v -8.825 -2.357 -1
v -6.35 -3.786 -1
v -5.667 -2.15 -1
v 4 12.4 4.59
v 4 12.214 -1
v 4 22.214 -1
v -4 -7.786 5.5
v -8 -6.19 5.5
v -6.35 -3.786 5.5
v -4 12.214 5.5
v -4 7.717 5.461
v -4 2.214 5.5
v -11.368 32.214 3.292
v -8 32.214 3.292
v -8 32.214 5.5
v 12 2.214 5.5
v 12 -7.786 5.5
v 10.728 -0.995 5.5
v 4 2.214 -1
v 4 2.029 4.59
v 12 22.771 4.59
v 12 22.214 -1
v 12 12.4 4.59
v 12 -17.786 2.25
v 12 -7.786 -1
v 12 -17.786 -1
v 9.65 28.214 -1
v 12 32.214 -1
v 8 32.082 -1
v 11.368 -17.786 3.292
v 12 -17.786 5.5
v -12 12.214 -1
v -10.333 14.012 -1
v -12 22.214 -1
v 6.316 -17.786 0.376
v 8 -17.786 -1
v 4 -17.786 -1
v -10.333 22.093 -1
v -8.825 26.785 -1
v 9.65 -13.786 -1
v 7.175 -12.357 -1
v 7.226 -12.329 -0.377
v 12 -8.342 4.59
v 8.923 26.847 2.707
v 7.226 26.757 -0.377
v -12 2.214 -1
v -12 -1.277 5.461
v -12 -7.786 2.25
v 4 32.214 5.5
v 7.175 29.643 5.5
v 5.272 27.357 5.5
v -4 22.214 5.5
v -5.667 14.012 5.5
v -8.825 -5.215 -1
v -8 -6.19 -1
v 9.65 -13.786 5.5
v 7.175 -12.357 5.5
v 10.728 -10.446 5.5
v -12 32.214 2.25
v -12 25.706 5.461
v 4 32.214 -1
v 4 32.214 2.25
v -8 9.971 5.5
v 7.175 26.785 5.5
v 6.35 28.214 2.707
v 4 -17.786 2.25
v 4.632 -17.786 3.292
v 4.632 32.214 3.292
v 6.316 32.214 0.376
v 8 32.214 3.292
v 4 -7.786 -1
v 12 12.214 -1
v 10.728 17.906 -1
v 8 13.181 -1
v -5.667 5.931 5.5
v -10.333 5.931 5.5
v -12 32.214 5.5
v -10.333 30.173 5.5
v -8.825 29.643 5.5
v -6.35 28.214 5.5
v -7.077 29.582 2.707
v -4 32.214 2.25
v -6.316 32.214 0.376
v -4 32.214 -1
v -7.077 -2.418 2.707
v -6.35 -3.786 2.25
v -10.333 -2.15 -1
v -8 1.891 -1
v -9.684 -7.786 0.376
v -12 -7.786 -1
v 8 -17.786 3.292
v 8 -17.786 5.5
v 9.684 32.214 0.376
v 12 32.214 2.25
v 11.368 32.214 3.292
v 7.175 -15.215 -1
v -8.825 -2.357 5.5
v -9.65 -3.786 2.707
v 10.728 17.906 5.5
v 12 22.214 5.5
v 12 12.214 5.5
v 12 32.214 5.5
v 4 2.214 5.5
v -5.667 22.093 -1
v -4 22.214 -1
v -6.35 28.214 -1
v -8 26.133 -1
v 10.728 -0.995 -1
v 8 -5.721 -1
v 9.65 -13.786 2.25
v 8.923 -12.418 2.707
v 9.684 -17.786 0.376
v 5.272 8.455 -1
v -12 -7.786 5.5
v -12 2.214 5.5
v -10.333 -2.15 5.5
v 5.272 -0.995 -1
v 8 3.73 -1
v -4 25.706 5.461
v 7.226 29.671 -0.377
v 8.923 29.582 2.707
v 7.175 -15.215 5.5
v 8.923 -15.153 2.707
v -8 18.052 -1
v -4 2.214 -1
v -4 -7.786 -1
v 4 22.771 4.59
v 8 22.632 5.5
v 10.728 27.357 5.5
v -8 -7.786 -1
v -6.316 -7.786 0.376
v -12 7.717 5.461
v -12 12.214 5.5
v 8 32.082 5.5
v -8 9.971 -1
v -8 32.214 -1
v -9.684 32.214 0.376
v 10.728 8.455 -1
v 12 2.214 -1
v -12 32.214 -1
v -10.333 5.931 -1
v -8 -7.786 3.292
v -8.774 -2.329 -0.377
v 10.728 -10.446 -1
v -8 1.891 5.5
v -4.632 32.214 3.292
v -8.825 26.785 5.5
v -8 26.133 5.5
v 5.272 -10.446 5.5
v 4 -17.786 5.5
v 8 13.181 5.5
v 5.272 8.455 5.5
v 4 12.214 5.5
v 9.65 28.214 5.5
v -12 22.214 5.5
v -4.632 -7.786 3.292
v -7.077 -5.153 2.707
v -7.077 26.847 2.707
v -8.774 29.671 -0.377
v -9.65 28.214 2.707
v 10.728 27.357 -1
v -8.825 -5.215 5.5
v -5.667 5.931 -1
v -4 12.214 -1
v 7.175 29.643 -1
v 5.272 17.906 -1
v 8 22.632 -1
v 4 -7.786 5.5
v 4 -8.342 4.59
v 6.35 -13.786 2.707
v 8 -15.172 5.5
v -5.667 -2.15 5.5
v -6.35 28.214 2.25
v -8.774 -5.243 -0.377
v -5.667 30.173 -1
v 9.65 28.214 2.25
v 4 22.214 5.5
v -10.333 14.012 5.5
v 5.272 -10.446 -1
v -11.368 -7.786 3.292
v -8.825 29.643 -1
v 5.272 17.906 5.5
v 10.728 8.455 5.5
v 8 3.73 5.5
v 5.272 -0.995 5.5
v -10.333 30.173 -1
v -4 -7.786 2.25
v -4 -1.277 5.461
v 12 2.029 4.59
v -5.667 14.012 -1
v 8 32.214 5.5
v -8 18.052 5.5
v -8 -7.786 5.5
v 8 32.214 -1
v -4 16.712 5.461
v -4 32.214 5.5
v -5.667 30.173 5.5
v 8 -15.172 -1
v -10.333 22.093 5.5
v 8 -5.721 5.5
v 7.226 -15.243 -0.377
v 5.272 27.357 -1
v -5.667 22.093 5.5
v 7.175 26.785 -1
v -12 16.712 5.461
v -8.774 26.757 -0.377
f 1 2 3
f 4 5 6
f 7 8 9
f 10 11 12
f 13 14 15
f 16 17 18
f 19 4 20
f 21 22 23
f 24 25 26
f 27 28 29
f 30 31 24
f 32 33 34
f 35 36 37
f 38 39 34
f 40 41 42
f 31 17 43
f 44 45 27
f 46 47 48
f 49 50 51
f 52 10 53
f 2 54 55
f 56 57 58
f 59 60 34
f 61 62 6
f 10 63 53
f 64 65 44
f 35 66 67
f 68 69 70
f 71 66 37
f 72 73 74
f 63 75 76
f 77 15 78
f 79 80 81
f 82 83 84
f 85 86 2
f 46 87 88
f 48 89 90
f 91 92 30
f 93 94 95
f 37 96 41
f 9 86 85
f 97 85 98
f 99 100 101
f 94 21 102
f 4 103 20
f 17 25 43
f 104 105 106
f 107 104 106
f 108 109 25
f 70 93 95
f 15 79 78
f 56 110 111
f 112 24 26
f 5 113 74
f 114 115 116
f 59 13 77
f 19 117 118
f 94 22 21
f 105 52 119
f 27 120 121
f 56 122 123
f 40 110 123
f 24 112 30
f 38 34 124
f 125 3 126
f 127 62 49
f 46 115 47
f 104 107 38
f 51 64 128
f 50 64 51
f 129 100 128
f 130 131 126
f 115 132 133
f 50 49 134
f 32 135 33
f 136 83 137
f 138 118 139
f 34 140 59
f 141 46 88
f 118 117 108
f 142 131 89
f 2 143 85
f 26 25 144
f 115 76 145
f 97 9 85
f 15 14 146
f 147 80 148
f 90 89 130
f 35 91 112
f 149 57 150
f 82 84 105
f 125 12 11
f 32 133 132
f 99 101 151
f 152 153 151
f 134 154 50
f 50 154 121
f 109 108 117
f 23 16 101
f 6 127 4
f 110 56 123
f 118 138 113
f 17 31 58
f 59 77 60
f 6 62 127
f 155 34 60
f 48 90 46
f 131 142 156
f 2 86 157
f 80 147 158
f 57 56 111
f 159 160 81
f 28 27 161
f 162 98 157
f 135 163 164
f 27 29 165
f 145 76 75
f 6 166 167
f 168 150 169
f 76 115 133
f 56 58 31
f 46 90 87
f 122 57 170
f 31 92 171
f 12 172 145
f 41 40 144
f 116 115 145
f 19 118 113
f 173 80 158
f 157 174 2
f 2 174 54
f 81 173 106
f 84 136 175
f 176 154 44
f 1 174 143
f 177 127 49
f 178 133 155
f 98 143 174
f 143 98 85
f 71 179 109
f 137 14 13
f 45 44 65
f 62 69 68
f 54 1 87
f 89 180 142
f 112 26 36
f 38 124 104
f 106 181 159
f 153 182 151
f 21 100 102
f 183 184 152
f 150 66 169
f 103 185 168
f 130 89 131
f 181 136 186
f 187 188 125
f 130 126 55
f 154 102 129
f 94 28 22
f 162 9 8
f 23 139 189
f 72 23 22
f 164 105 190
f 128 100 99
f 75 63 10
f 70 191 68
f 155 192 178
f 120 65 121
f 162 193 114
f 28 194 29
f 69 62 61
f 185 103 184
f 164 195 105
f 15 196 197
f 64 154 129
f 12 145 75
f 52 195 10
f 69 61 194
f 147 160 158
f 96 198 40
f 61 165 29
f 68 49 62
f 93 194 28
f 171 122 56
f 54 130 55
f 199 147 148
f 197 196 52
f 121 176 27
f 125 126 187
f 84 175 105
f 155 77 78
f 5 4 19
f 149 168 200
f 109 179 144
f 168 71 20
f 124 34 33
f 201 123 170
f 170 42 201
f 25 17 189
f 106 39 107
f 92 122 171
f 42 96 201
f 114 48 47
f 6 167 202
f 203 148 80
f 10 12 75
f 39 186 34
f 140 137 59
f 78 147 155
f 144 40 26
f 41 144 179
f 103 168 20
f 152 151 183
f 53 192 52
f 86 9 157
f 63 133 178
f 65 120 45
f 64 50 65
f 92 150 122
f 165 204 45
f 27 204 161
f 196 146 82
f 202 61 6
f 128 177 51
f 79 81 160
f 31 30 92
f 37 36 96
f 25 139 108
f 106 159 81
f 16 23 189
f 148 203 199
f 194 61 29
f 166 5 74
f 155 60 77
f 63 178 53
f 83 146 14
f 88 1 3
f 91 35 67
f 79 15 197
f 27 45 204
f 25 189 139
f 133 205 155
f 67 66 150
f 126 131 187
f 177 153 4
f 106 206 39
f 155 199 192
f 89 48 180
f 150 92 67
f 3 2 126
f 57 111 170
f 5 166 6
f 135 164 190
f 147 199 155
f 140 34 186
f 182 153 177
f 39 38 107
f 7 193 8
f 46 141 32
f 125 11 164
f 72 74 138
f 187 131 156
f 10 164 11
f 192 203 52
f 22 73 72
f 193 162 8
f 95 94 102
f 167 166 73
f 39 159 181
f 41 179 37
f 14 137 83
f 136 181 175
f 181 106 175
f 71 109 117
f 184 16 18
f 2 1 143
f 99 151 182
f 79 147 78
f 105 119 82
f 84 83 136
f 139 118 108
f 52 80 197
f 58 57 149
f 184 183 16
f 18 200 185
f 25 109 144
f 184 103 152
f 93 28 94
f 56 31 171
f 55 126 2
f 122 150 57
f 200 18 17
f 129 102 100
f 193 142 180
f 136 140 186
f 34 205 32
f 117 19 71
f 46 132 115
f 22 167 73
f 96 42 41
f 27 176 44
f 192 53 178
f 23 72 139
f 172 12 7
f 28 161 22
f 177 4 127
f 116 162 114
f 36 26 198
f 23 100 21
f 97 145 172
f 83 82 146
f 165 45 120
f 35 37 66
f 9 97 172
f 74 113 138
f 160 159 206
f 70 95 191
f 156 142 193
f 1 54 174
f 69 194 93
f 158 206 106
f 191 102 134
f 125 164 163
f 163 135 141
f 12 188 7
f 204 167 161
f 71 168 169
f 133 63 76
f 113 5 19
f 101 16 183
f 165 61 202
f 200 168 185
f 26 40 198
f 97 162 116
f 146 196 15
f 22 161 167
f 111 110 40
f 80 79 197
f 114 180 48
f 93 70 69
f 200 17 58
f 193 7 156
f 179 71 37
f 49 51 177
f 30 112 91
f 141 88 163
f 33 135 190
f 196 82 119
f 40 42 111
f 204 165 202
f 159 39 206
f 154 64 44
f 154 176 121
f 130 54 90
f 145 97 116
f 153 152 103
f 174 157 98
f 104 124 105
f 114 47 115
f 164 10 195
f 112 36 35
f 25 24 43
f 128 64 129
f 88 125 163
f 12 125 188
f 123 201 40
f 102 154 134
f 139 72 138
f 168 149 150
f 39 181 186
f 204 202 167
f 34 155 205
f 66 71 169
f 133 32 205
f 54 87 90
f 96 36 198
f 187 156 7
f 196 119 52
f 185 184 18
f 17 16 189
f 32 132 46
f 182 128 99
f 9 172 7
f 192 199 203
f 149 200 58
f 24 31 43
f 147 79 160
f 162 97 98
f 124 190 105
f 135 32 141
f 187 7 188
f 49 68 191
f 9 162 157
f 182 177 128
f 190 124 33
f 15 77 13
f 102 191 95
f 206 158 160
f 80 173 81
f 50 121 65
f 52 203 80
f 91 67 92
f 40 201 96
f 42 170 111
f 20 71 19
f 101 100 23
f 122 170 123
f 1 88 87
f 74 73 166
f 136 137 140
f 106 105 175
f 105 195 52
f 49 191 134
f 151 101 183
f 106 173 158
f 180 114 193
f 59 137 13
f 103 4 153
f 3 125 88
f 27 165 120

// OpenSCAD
// CSG file generated from FreeCAD 0.16.6706 (Git)
group() {
 group(){
difference() {
multmatrix([[1.0, 0.0, 0.0,            0.0], [0.0, 1.0, 0.0, 0.0], [0.0, 0.0, 1.0, -0.5], [             0, 0, 0, 1]]){
polyhedron ( points = [[4.000000,-17.785645,-0.500000],[4.000000,-17.785645,6.000000],[12.000000,-17.785645,-0.500000],[12.000000,-17.785645,6.000000],[12.000000,32.214355,-0.500000],[12.000000,32.214355,6.000000],[4.000000,32.214355,-0.500000],[4.000000,32.214355,6.000000],[9.650000,28.214355,-0.500000],[9.650000,28.214355,6.000000],[9.650000,-13.785645,-0.500000],[9.650000,-13.785645,6.000000],[-12.000000,32.214355,-0.500000],[-12.000000,32.214355,6.000000],[-4.000000,32.214355,-0.500000],[-4.000000,32.214355,6.000000],[-4.000000,-7.785645,-0.500000],[-4.000000,-7.785645,6.000000],[-12.000000,-7.785645,-0.500000],[-12.000000,-7.785645,6.000000],[-6.350000,28.214355,-0.500000],[-6.350000,28.214355,6.000000],[-6.350000,-3.785645,-0.500000],[-6.350000,-3.785645,6.000000],[4.000000,-17.785645,2.750000],[12.000000,-17.785645,2.750000],[8.000000,-17.785645,-0.500000],[8.000000,-17.785645,6.000000],[12.000000,32.214355,2.750000],[12.000000,-7.785645,-0.500000],[12.000000,2.214355,-0.500000],[12.000000,12.214355,-0.500000],[12.000000,22.214355,-0.500000],[12.000000,-7.785645,6.000000],[12.000000,2.214355,6.000000],[12.000000,12.214355,6.000000],[12.000000,22.214355,6.000000],[4.000000,32.214355,2.750000],[8.000000,32.214355,-0.500000],[8.000000,32.214355,6.000000],[4.000000,-7.785645,-0.500000],[4.000000,2.214355,-0.500000],[4.000000,12.214355,-0.500000],[4.000000,22.214355,-0.500000],[4.000000,-7.785645,6.000000],[4.000000,2.214355,6.000000],[4.000000,12.214355,6.000000],[4.000000,22.214355,6.000000],[9.650000,28.214355,2.750000],[7.175000,29.643297,-0.500000],[7.175000,26.785414,-0.500000],[7.175000,29.643297,6.000000],[7.175000,26.785414,6.000000],[9.650000,-13.785645,2.750000],[7.175000,-12.356703,-0.500000],[7.175000,-15.214587,-0.500000],[7.175000,-12.356703,6.000000],[7.175000,-15.214587,6.000000],[-12.000000,32.214355,2.750000],[-4.000000,32.214355,2.750000],[-8.000000,32.214355,-0.500000],[-8.000000,32.214355,6.000000],[-4.000000,-7.785645,2.750000],[-4.000000,22.214355,-0.500000],[-4.000000,12.214355,-0.500000],[-4.000000,2.214355,-0.500000],[-4.000000,22.214355,6.000000],[-4.000000,12.214355,6.000000],[-4.000000,2.214355,6.000000],[-12.000000,-7.785645,2.750000],[-8.000000,-7.785645,-0.500000],[-8.000000,-7.785645,6.000000],[-12.000000,2.214355,-0.500000],[-12.000000,12.214355,-0.500000],[-12.000000,22.214355,-0.500000],[-12.000000,2.214355,6.000000],[-12.000000,12.214355,6.000000],[-12.000000,22.214355,6.000000],[-6.350000,28.214355,2.750000],[-8.825000,29.643297,-0.500000],[-8.825000,26.785414,-0.500000],[-8.825000,29.643297,6.000000],[-8.825000,26.785414,6.000000],[-6.350000,-3.785645,2.750000],[-8.825000,-2.356703,-0.500000],[-8.825000,-5.214587,-0.500000],[-8.825000,-2.356703,6.000000],[-8.825000,-5.214587,6.000000],[4.632332,-17.785645,3.792028],[11.367668,-17.785645,3.792028],[8.000000,-17.785645,3.792028],[6.316166,-17.785645,0.875542],[9.683834,-17.785645,0.875542],[12.000000,22.770947,5.089826],[12.000000,12.399886,5.089826],[12.000000,2.028824,5.089826],[12.000000,-8.342237,5.089826],[11.367668,32.214355,3.792028],[4.632332,32.214355,3.792028],[8.000000,32.214355,3.792028],[9.683834,32.214355,0.875542],[6.316166,32.214355,0.875542],[4.000000,22.770947,5.089826],[4.000000,12.399886,5.089826],[4.000000,2.028824,5.089826],[4.000000,-8.342237,5.089826],[8.923087,29.581984,3.206738],[8.923087,26.846725,3.206738],[6.350000,28.214355,3.206738],[7.225595,29.671337,0.123381],[7.225595,26.757374,0.123381],[8.923087,-12.418015,3.206738],[8.923087,-15.153275,3.206738],[6.350000,-13.785645,3.206738],[7.225595,-12.328663,0.123381],[7.225595,-15.242627,0.123381],[8.000000,13.180872,-0.500000],[8.000000,32.082493,-0.500000],[8.000000,-5.720749,-0.500000],[5.271786,17.906277,-0.500000],[10.728214,17.906277,-0.500000],[8.000000,22.631683,-0.500000],[10.728214,27.357088,-0.500000],[5.271786,27.357088,-0.500000],[8.000000,-15.171560,-0.500000],[10.728214,-10.446155,-0.500000],[5.271786,-10.446155,-0.500000],[10.728214,8.455466,-0.500000],[5.271786,8.455466,-0.500000],[8.000000,3.730061,-0.500000],[5.271786,-0.995344,-0.500000],[10.728214,-0.995344,-0.500000],[8.000000,13.180872,6.000000],[8.000000,32.082493,6.000000],[8.000000,-5.720749,6.000000],[5.271786,17.906277,6.000000],[10.728214,17.906277,6.000000],[8.000000,22.631683,6.000000],[10.728214,27.357088,6.000000],[5.271786,27.357088,6.000000],[8.000000,-15.171560,6.000000],[10.728214,-10.446155,6.000000],[5.271786,-10.446155,6.000000],[10.728214,8.455466,6.000000],[5.271786,8.455466,6.000000],[8.000000,3.730061,6.000000],[5.271786,-0.995344,6.000000],[10.728214,-0.995344,6.000000],[-11.367668,32.214355,3.792028],[-4.632332,32.214355,3.792028],[-8.000000,32.214355,3.792028],[-9.683834,32.214355,0.875542],[-6.316166,32.214355,0.875542],[-4.000000,-1.277111,5.960699],[-4.000000,7.717200,5.960699],[-4.000000,16.711510,5.960699],[-4.000000,25.705820,5.960699],[-4.632332,-7.785645,3.792028],[-11.367668,-7.785645,3.792028],[-8.000000,-7.785645,3.792028],[-6.316166,-7.785645,0.875542],[-9.683834,-7.785645,0.875542],[-12.000000,25.705820,5.960699],[-12.000000,16.711510,5.960699],[-12.000000,7.717200,5.960699],[-12.000000,-1.277111,5.960699],[-7.076913,29.581984,3.206738],[-7.076913,26.846725,3.206738],[-9.650000,28.214355,3.206738],[-8.774405,29.671337,0.123381],[-8.774405,26.757374,0.123381],[-7.076913,-2.418015,3.206738],[-7.076913,-5.153275,3.206738],[-9.650000,-3.785645,3.206738],[-8.774405,-2.328663,0.123381],[-8.774405,-5.242627,0.123381],[-8.000000,18.052225,-0.500000],[-8.000000,1.890665,-0.500000],[-5.667280,22.092615,-0.500000],[-10.332720,22.092615,-0.500000],[-8.000000,26.133005,-0.500000],[-10.332720,30.173395,-0.500000],[-5.667280,30.173395,-0.500000],[-8.000000,-6.190115,-0.500000],[-10.332720,-2.149725,-0.500000],[-5.667280,-2.149725,-0.500000],[-10.332720,14.011835,-0.500000],[-5.667280,14.011835,-0.500000],[-8.000000,9.971445,-0.500000],[-5.667280,5.931055,-0.500000],[-10.332720,5.931055,-0.500000],[-8.000000,18.052225,6.000000],[-8.000000,1.890665,6.000000],[-5.667280,22.092615,6.000000],[-10.332720,22.092615,6.000000],[-8.000000,26.133005,6.000000],[-10.332720,30.173395,6.000000],[-5.667280,30.173395,6.000000],[-8.000000,-6.190115,6.000000],[-10.332720,-2.149725,6.000000],[-5.667280,-2.149725,6.000000],[-10.332720,14.011835,6.000000],[-5.667280,14.011835,6.000000],[-8.000000,9.971445,6.000000],[-5.667280,5.931055,6.000000],[-10.332720,5.931055,6.000000]], triangles = [[185,22,84],[43,42,103],[23,198,17],[68,154,67],[61,150,148],[147,33,34],[104,103,41],[94,32,93],[2,29,25],[117,4,8],[25,3,89],[74,186,73],[0,26,91],[74,80,179],[114,54,10],[96,33,3],[8,110,107],[69,165,72],[139,51,7],[202,67,66],[183,85,22],[141,56,11],[74,162,58],[43,37,6],[202,203,67],[107,108,52],[88,24,91],[99,101,98],[0,24,40],[116,120,31],[205,204,203],[196,61,13],[166,21,81],[14,152,59],[22,83,171],[177,184,72],[18,161,69],[89,27,90],[97,28,100],[54,55,0],[171,83,23],[173,171,86],[35,36,136],[5,93,28],[104,45,103],[96,29,33],[20,63,178],[20,178,180],[29,118,131],[97,100,99],[196,81,61],[111,53,11],[2,25,92],[116,128,42],[199,75,19],[13,148,58],[129,130,41],[93,32,28],[156,66,63],[106,109,8],[112,57,11],[112,53,10],[89,92,25],[176,74,179],[16,185,65],[7,37,102],[165,75,72],[179,180,178],[137,52,139],[139,52,51],[137,36,138],[16,160,70],[76,164,75],[133,7,51],[186,188,73],[151,152,60],[30,129,127],[58,12,74],[177,72,190],[131,130,129],[161,160,159],[171,174,22],[125,29,2],[192,205,75],[171,23,86],[149,150,61],[195,21,82],[70,161,18],[92,90,91],[1,56,142],[63,14,59],[154,68,65],[164,76,73],[132,35,136],[132,46,144],[51,9,133],[106,9,51],[130,131,118],[35,34,94],[103,102,43],[112,11,53],[128,127,129],[141,3,33],[162,13,58],[102,37,43],[162,74,77],[72,18,69],[157,159,160],[172,83,22],[167,82,21],[111,11,56],[166,168,169],[122,8,4],[172,173,87],[64,189,188],[49,117,8],[204,205,192],[121,119,43],[105,1,44],[76,75,205],[3,141,11],[184,18,72],[113,56,57],[140,27,3],[192,200,68],[125,10,54],[192,75,199],[128,129,41],[167,21,78],[22,175,172],[85,175,22],[20,78,166],[182,60,14],[107,9,48],[174,175,84],[7,102,47],[77,76,201],[175,174,173],[171,173,174],[118,126,40],[148,150,151],[108,107,110],[98,101,37],[184,84,85],[159,158,161],[26,2,92],[178,176,179],[169,79,20],[132,135,46],[5,36,93],[144,145,143],[105,24,1],[44,146,45],[160,161,70],[181,60,79],[65,153,62],[183,16,70],[138,5,9],[32,4,28],[198,23,87],[95,30,94],[32,94,31],[187,63,64],[136,36,137],[67,203,204],[98,39,99],[201,191,77],[106,108,109],[19,71,87],[117,38,4],[6,37,101],[145,45,146],[63,155,64],[197,15,61],[138,9,52],[204,192,68],[67,155,66],[38,6,101],[167,168,82],[10,124,55],[117,49,6],[37,7,98],[4,38,100],[11,57,140],[183,70,85],[195,82,194],[66,15,197],[8,48,106],[62,16,65],[63,182,14],[196,13,77],[41,103,42],[134,44,142],[125,126,118],[104,40,44],[186,74,176],[113,112,115],[115,114,113],[95,33,29],[180,80,20],[140,57,27],[115,55,114],[165,69,19],[123,121,43],[21,195,193],[204,68,67],[74,181,80],[58,151,12],[77,82,196],[2,10,125],[126,125,54],[104,44,45],[143,132,144],[66,191,202],[172,23,83],[201,76,203],[110,109,108],[108,51,52],[57,1,27],[110,50,49],[122,50,8],[59,149,15],[43,6,123],[139,47,137],[168,166,81],[27,89,3],[55,26,0],[131,30,29],[166,169,20],[95,94,34],[194,193,195],[117,6,38],[116,42,119],[13,162,77],[202,201,203],[150,149,152],[185,84,177],[88,91,90],[197,61,81],[50,110,8],[30,95,29],[77,163,76],[1,24,88],[62,160,16],[103,46,47],[80,170,20],[191,194,77],[158,69,161],[88,27,1],[16,22,185],[113,111,56],[43,119,42],[187,64,188],[77,194,82],[181,74,12],[47,46,135],[180,179,80],[198,71,17],[73,190,72],[64,154,65],[127,116,31],[157,160,62],[154,64,67],[66,193,191],[31,120,32],[198,87,71],[5,28,97],[120,119,121],[79,169,80],[0,126,54],[152,151,150],[182,79,60],[182,20,79],[130,118,40],[147,34,145],[174,84,22],[135,132,136],[196,82,81],[59,156,63],[60,152,14],[131,129,30],[197,21,66],[142,56,141],[34,143,145],[146,134,147],[125,118,29],[144,45,145],[28,4,100],[140,3,11],[22,16,183],[56,1,57],[33,147,134],[36,5,138],[158,159,71],[181,12,60],[73,163,74],[40,41,130],[75,164,72],[120,121,32],[54,114,55],[107,48,8],[201,202,191],[30,31,94],[17,68,200],[32,122,4],[102,103,47],[19,87,199],[124,2,26],[93,36,94],[200,192,86],[149,59,152],[109,110,49],[24,0,91],[200,86,23],[127,128,116],[170,169,168],[39,97,99],[71,159,157],[175,85,84],[100,38,101],[20,170,167],[133,5,39],[189,64,65],[190,188,189],[17,153,68],[122,121,50],[105,44,40],[205,203,76],[41,42,128],[143,34,35],[123,6,49],[146,44,134],[124,10,2],[199,87,86],[61,15,149],[121,122,32],[10,53,111],[197,81,21],[69,158,19],[101,99,100],[141,33,134],[157,17,71],[0,40,126],[47,139,7],[90,92,89],[189,177,190],[187,188,186],[156,59,15],[111,114,10],[123,49,50],[170,80,169],[107,52,9],[106,48,9],[18,85,70],[199,86,192],[45,144,46],[173,172,175],[63,176,178],[75,165,19],[155,67,64],[91,26,92],[96,25,29],[138,52,137],[189,65,177],[153,65,68],[10,115,112],[133,9,5],[127,31,30],[1,142,44],[181,79,80],[121,123,50],[163,77,74],[105,40,24],[163,73,76],[18,184,85],[124,26,55],[17,157,62],[66,156,15],[147,145,146],[95,34,33],[72,164,73],[136,137,135],[17,200,23],[193,194,191],[141,134,142],[96,3,25],[168,81,82],[173,86,87],[63,187,176],[190,73,188],[153,17,62],[39,98,7],[172,87,23],[137,47,135],[186,176,187],[148,13,61],[97,39,5],[168,167,170],[166,78,21],[108,106,51],[21,193,66],[27,88,90],[55,115,10],[111,113,114],[41,40,104],[94,36,35],[112,113,57],[184,177,84],[119,120,116],[12,151,60],[182,63,20],[66,155,63],[133,39,7],[143,35,132],[167,78,20],[71,19,158],[148,151,58],[46,103,45],[177,65,185],[109,49,8]]);
}
}
}
}
